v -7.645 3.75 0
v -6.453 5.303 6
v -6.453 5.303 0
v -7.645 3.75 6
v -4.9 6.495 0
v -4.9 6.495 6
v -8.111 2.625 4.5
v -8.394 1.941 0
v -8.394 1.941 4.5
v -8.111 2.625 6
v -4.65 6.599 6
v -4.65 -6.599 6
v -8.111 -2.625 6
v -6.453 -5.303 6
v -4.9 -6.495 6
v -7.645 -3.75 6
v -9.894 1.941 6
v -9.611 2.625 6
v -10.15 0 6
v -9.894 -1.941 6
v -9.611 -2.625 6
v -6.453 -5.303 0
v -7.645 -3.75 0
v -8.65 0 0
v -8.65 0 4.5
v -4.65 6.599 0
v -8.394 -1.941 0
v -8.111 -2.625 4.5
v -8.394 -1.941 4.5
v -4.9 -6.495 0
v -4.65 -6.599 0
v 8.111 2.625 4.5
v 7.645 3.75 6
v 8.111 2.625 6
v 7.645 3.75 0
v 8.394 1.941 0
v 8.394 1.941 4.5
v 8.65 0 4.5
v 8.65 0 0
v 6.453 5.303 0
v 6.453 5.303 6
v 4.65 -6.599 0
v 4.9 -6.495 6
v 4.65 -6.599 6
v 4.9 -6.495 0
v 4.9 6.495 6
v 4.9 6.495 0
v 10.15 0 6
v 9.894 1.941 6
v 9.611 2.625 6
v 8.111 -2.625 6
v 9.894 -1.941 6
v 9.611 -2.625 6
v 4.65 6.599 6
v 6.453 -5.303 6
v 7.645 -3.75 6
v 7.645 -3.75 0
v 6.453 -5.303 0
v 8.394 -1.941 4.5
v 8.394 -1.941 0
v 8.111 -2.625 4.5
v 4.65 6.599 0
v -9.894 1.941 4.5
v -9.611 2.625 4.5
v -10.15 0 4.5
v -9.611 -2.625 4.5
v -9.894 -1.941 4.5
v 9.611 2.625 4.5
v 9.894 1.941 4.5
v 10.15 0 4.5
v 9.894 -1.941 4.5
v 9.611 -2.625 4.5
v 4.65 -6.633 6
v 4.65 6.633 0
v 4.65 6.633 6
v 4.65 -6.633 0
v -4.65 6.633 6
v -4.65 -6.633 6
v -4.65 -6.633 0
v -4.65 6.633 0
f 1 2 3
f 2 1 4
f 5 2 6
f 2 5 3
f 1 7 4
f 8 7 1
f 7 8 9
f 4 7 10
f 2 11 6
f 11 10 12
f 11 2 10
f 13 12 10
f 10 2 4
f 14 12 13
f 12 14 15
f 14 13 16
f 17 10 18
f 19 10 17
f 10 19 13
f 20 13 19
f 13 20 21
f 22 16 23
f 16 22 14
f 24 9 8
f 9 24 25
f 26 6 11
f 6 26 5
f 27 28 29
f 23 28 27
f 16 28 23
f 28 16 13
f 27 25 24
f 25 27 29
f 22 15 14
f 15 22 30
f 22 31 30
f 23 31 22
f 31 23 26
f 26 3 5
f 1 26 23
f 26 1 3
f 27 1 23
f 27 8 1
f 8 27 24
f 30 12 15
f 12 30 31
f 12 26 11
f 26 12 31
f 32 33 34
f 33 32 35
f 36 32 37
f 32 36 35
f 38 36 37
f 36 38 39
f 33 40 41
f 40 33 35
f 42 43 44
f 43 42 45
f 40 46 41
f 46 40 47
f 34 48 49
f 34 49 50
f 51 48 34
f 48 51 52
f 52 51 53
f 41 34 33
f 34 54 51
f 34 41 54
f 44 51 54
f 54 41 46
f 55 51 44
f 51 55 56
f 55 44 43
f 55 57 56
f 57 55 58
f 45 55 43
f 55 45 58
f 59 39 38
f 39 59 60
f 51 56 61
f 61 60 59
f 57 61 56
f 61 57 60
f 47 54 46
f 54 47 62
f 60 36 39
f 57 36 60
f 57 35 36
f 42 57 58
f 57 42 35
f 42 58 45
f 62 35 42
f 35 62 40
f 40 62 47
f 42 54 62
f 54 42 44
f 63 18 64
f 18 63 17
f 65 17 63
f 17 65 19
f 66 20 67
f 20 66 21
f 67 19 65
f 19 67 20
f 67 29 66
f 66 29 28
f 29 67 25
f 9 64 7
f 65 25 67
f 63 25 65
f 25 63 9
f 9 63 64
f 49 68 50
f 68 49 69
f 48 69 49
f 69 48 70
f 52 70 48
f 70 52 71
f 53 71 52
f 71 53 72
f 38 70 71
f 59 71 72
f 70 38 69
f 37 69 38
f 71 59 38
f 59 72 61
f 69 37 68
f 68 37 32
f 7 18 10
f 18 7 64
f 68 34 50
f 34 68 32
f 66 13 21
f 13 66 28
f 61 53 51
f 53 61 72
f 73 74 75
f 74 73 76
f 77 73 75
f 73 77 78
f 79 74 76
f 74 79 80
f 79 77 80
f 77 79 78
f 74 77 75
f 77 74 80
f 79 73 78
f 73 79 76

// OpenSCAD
wall_thick=4;

breaker_arc_radius=7.5;
breaker_arc_arc_sep=9.3;
breaker_arc_width=4;
breaker_tab_height=5.25;
breaker_tab_width=3;

breaker_arc_arc_sep_tabs=breaker_arc_arc_sep+breaker_tab_width;

z_fite=0.05;

breaker_tab_ratio=0.75;
breaker_tab_ratioi=1-breaker_tab_ratio;

recep_thick=wall_thick*1.5;

breaker_height = 2*breaker_arc_radius*cos(asin((breaker_arc_radius-breaker_arc_width)/breaker_arc_radius));

union() {
  translate([-(breaker_arc_arc_sep-2*(breaker_arc_radius-breaker_arc_width))/2,0,0])
  union() {
    difference() {
      cylinder(recep_thick, breaker_arc_radius, breaker_arc_radius);

      translate([-(breaker_arc_radius-breaker_arc_width),-breaker_arc_radius,-breaker_arc_radius]) cube(breaker_arc_radius*2);
      }

      translate([breaker_arc_arc_sep-2*(breaker_arc_radius-breaker_arc_width),0,0])
    difference() {
      cylinder(recep_thick, breaker_arc_radius, breaker_arc_radius);

      translate([-breaker_arc_radius*2+(breaker_arc_radius-breaker_arc_width),-breaker_arc_radius,-breaker_arc_radius]) cube(breaker_arc_radius*2);
    }
  }

  translate([0,0,recep_thick/2])
  cube([breaker_arc_arc_sep,breaker_height,recep_thick],center=true);
   
  translate([0,0,recep_thick*breaker_tab_ratio])
  difference() {
    
    translate([-(breaker_arc_arc_sep_tabs-2*(breaker_arc_radius-breaker_arc_width))/2,0,0]) union() {
      difference() {
        cylinder(recep_thick*breaker_tab_ratioi, breaker_arc_radius, breaker_arc_radius);

        translate([-(breaker_arc_radius-breaker_arc_width),-breaker_arc_radius,-breaker_arc_radius]) cube(breaker_arc_radius*2);
        }

        translate([breaker_arc_arc_sep_tabs-2*(breaker_arc_radius-breaker_arc_width),0,0])
      difference() {
        cylinder(recep_thick*breaker_tab_ratioi, breaker_arc_radius, breaker_arc_radius);

        translate([-breaker_arc_radius*2+(breaker_arc_radius-breaker_arc_width),-breaker_arc_radius,-breaker_arc_radius]) cube(breaker_arc_radius*2);
      }
    }
    
    union() {
      translate([-breaker_arc_radius-breaker_arc_arc_sep_tabs/2,breaker_tab_height/2,-z_fite]) cube([breaker_arc_radius*2+breaker_arc_arc_sep_tabs,breaker_arc_radius*2,recep_thick*2]);
      
        translate([-breaker_arc_radius-breaker_arc_arc_sep_tabs/2,-breaker_tab_height/2-breaker_arc_radius*2,-z_fite]) cube([breaker_arc_radius*2+breaker_arc_arc_sep_tabs,breaker_arc_radius*2,recep_thick*2]);
    }
  }
}
